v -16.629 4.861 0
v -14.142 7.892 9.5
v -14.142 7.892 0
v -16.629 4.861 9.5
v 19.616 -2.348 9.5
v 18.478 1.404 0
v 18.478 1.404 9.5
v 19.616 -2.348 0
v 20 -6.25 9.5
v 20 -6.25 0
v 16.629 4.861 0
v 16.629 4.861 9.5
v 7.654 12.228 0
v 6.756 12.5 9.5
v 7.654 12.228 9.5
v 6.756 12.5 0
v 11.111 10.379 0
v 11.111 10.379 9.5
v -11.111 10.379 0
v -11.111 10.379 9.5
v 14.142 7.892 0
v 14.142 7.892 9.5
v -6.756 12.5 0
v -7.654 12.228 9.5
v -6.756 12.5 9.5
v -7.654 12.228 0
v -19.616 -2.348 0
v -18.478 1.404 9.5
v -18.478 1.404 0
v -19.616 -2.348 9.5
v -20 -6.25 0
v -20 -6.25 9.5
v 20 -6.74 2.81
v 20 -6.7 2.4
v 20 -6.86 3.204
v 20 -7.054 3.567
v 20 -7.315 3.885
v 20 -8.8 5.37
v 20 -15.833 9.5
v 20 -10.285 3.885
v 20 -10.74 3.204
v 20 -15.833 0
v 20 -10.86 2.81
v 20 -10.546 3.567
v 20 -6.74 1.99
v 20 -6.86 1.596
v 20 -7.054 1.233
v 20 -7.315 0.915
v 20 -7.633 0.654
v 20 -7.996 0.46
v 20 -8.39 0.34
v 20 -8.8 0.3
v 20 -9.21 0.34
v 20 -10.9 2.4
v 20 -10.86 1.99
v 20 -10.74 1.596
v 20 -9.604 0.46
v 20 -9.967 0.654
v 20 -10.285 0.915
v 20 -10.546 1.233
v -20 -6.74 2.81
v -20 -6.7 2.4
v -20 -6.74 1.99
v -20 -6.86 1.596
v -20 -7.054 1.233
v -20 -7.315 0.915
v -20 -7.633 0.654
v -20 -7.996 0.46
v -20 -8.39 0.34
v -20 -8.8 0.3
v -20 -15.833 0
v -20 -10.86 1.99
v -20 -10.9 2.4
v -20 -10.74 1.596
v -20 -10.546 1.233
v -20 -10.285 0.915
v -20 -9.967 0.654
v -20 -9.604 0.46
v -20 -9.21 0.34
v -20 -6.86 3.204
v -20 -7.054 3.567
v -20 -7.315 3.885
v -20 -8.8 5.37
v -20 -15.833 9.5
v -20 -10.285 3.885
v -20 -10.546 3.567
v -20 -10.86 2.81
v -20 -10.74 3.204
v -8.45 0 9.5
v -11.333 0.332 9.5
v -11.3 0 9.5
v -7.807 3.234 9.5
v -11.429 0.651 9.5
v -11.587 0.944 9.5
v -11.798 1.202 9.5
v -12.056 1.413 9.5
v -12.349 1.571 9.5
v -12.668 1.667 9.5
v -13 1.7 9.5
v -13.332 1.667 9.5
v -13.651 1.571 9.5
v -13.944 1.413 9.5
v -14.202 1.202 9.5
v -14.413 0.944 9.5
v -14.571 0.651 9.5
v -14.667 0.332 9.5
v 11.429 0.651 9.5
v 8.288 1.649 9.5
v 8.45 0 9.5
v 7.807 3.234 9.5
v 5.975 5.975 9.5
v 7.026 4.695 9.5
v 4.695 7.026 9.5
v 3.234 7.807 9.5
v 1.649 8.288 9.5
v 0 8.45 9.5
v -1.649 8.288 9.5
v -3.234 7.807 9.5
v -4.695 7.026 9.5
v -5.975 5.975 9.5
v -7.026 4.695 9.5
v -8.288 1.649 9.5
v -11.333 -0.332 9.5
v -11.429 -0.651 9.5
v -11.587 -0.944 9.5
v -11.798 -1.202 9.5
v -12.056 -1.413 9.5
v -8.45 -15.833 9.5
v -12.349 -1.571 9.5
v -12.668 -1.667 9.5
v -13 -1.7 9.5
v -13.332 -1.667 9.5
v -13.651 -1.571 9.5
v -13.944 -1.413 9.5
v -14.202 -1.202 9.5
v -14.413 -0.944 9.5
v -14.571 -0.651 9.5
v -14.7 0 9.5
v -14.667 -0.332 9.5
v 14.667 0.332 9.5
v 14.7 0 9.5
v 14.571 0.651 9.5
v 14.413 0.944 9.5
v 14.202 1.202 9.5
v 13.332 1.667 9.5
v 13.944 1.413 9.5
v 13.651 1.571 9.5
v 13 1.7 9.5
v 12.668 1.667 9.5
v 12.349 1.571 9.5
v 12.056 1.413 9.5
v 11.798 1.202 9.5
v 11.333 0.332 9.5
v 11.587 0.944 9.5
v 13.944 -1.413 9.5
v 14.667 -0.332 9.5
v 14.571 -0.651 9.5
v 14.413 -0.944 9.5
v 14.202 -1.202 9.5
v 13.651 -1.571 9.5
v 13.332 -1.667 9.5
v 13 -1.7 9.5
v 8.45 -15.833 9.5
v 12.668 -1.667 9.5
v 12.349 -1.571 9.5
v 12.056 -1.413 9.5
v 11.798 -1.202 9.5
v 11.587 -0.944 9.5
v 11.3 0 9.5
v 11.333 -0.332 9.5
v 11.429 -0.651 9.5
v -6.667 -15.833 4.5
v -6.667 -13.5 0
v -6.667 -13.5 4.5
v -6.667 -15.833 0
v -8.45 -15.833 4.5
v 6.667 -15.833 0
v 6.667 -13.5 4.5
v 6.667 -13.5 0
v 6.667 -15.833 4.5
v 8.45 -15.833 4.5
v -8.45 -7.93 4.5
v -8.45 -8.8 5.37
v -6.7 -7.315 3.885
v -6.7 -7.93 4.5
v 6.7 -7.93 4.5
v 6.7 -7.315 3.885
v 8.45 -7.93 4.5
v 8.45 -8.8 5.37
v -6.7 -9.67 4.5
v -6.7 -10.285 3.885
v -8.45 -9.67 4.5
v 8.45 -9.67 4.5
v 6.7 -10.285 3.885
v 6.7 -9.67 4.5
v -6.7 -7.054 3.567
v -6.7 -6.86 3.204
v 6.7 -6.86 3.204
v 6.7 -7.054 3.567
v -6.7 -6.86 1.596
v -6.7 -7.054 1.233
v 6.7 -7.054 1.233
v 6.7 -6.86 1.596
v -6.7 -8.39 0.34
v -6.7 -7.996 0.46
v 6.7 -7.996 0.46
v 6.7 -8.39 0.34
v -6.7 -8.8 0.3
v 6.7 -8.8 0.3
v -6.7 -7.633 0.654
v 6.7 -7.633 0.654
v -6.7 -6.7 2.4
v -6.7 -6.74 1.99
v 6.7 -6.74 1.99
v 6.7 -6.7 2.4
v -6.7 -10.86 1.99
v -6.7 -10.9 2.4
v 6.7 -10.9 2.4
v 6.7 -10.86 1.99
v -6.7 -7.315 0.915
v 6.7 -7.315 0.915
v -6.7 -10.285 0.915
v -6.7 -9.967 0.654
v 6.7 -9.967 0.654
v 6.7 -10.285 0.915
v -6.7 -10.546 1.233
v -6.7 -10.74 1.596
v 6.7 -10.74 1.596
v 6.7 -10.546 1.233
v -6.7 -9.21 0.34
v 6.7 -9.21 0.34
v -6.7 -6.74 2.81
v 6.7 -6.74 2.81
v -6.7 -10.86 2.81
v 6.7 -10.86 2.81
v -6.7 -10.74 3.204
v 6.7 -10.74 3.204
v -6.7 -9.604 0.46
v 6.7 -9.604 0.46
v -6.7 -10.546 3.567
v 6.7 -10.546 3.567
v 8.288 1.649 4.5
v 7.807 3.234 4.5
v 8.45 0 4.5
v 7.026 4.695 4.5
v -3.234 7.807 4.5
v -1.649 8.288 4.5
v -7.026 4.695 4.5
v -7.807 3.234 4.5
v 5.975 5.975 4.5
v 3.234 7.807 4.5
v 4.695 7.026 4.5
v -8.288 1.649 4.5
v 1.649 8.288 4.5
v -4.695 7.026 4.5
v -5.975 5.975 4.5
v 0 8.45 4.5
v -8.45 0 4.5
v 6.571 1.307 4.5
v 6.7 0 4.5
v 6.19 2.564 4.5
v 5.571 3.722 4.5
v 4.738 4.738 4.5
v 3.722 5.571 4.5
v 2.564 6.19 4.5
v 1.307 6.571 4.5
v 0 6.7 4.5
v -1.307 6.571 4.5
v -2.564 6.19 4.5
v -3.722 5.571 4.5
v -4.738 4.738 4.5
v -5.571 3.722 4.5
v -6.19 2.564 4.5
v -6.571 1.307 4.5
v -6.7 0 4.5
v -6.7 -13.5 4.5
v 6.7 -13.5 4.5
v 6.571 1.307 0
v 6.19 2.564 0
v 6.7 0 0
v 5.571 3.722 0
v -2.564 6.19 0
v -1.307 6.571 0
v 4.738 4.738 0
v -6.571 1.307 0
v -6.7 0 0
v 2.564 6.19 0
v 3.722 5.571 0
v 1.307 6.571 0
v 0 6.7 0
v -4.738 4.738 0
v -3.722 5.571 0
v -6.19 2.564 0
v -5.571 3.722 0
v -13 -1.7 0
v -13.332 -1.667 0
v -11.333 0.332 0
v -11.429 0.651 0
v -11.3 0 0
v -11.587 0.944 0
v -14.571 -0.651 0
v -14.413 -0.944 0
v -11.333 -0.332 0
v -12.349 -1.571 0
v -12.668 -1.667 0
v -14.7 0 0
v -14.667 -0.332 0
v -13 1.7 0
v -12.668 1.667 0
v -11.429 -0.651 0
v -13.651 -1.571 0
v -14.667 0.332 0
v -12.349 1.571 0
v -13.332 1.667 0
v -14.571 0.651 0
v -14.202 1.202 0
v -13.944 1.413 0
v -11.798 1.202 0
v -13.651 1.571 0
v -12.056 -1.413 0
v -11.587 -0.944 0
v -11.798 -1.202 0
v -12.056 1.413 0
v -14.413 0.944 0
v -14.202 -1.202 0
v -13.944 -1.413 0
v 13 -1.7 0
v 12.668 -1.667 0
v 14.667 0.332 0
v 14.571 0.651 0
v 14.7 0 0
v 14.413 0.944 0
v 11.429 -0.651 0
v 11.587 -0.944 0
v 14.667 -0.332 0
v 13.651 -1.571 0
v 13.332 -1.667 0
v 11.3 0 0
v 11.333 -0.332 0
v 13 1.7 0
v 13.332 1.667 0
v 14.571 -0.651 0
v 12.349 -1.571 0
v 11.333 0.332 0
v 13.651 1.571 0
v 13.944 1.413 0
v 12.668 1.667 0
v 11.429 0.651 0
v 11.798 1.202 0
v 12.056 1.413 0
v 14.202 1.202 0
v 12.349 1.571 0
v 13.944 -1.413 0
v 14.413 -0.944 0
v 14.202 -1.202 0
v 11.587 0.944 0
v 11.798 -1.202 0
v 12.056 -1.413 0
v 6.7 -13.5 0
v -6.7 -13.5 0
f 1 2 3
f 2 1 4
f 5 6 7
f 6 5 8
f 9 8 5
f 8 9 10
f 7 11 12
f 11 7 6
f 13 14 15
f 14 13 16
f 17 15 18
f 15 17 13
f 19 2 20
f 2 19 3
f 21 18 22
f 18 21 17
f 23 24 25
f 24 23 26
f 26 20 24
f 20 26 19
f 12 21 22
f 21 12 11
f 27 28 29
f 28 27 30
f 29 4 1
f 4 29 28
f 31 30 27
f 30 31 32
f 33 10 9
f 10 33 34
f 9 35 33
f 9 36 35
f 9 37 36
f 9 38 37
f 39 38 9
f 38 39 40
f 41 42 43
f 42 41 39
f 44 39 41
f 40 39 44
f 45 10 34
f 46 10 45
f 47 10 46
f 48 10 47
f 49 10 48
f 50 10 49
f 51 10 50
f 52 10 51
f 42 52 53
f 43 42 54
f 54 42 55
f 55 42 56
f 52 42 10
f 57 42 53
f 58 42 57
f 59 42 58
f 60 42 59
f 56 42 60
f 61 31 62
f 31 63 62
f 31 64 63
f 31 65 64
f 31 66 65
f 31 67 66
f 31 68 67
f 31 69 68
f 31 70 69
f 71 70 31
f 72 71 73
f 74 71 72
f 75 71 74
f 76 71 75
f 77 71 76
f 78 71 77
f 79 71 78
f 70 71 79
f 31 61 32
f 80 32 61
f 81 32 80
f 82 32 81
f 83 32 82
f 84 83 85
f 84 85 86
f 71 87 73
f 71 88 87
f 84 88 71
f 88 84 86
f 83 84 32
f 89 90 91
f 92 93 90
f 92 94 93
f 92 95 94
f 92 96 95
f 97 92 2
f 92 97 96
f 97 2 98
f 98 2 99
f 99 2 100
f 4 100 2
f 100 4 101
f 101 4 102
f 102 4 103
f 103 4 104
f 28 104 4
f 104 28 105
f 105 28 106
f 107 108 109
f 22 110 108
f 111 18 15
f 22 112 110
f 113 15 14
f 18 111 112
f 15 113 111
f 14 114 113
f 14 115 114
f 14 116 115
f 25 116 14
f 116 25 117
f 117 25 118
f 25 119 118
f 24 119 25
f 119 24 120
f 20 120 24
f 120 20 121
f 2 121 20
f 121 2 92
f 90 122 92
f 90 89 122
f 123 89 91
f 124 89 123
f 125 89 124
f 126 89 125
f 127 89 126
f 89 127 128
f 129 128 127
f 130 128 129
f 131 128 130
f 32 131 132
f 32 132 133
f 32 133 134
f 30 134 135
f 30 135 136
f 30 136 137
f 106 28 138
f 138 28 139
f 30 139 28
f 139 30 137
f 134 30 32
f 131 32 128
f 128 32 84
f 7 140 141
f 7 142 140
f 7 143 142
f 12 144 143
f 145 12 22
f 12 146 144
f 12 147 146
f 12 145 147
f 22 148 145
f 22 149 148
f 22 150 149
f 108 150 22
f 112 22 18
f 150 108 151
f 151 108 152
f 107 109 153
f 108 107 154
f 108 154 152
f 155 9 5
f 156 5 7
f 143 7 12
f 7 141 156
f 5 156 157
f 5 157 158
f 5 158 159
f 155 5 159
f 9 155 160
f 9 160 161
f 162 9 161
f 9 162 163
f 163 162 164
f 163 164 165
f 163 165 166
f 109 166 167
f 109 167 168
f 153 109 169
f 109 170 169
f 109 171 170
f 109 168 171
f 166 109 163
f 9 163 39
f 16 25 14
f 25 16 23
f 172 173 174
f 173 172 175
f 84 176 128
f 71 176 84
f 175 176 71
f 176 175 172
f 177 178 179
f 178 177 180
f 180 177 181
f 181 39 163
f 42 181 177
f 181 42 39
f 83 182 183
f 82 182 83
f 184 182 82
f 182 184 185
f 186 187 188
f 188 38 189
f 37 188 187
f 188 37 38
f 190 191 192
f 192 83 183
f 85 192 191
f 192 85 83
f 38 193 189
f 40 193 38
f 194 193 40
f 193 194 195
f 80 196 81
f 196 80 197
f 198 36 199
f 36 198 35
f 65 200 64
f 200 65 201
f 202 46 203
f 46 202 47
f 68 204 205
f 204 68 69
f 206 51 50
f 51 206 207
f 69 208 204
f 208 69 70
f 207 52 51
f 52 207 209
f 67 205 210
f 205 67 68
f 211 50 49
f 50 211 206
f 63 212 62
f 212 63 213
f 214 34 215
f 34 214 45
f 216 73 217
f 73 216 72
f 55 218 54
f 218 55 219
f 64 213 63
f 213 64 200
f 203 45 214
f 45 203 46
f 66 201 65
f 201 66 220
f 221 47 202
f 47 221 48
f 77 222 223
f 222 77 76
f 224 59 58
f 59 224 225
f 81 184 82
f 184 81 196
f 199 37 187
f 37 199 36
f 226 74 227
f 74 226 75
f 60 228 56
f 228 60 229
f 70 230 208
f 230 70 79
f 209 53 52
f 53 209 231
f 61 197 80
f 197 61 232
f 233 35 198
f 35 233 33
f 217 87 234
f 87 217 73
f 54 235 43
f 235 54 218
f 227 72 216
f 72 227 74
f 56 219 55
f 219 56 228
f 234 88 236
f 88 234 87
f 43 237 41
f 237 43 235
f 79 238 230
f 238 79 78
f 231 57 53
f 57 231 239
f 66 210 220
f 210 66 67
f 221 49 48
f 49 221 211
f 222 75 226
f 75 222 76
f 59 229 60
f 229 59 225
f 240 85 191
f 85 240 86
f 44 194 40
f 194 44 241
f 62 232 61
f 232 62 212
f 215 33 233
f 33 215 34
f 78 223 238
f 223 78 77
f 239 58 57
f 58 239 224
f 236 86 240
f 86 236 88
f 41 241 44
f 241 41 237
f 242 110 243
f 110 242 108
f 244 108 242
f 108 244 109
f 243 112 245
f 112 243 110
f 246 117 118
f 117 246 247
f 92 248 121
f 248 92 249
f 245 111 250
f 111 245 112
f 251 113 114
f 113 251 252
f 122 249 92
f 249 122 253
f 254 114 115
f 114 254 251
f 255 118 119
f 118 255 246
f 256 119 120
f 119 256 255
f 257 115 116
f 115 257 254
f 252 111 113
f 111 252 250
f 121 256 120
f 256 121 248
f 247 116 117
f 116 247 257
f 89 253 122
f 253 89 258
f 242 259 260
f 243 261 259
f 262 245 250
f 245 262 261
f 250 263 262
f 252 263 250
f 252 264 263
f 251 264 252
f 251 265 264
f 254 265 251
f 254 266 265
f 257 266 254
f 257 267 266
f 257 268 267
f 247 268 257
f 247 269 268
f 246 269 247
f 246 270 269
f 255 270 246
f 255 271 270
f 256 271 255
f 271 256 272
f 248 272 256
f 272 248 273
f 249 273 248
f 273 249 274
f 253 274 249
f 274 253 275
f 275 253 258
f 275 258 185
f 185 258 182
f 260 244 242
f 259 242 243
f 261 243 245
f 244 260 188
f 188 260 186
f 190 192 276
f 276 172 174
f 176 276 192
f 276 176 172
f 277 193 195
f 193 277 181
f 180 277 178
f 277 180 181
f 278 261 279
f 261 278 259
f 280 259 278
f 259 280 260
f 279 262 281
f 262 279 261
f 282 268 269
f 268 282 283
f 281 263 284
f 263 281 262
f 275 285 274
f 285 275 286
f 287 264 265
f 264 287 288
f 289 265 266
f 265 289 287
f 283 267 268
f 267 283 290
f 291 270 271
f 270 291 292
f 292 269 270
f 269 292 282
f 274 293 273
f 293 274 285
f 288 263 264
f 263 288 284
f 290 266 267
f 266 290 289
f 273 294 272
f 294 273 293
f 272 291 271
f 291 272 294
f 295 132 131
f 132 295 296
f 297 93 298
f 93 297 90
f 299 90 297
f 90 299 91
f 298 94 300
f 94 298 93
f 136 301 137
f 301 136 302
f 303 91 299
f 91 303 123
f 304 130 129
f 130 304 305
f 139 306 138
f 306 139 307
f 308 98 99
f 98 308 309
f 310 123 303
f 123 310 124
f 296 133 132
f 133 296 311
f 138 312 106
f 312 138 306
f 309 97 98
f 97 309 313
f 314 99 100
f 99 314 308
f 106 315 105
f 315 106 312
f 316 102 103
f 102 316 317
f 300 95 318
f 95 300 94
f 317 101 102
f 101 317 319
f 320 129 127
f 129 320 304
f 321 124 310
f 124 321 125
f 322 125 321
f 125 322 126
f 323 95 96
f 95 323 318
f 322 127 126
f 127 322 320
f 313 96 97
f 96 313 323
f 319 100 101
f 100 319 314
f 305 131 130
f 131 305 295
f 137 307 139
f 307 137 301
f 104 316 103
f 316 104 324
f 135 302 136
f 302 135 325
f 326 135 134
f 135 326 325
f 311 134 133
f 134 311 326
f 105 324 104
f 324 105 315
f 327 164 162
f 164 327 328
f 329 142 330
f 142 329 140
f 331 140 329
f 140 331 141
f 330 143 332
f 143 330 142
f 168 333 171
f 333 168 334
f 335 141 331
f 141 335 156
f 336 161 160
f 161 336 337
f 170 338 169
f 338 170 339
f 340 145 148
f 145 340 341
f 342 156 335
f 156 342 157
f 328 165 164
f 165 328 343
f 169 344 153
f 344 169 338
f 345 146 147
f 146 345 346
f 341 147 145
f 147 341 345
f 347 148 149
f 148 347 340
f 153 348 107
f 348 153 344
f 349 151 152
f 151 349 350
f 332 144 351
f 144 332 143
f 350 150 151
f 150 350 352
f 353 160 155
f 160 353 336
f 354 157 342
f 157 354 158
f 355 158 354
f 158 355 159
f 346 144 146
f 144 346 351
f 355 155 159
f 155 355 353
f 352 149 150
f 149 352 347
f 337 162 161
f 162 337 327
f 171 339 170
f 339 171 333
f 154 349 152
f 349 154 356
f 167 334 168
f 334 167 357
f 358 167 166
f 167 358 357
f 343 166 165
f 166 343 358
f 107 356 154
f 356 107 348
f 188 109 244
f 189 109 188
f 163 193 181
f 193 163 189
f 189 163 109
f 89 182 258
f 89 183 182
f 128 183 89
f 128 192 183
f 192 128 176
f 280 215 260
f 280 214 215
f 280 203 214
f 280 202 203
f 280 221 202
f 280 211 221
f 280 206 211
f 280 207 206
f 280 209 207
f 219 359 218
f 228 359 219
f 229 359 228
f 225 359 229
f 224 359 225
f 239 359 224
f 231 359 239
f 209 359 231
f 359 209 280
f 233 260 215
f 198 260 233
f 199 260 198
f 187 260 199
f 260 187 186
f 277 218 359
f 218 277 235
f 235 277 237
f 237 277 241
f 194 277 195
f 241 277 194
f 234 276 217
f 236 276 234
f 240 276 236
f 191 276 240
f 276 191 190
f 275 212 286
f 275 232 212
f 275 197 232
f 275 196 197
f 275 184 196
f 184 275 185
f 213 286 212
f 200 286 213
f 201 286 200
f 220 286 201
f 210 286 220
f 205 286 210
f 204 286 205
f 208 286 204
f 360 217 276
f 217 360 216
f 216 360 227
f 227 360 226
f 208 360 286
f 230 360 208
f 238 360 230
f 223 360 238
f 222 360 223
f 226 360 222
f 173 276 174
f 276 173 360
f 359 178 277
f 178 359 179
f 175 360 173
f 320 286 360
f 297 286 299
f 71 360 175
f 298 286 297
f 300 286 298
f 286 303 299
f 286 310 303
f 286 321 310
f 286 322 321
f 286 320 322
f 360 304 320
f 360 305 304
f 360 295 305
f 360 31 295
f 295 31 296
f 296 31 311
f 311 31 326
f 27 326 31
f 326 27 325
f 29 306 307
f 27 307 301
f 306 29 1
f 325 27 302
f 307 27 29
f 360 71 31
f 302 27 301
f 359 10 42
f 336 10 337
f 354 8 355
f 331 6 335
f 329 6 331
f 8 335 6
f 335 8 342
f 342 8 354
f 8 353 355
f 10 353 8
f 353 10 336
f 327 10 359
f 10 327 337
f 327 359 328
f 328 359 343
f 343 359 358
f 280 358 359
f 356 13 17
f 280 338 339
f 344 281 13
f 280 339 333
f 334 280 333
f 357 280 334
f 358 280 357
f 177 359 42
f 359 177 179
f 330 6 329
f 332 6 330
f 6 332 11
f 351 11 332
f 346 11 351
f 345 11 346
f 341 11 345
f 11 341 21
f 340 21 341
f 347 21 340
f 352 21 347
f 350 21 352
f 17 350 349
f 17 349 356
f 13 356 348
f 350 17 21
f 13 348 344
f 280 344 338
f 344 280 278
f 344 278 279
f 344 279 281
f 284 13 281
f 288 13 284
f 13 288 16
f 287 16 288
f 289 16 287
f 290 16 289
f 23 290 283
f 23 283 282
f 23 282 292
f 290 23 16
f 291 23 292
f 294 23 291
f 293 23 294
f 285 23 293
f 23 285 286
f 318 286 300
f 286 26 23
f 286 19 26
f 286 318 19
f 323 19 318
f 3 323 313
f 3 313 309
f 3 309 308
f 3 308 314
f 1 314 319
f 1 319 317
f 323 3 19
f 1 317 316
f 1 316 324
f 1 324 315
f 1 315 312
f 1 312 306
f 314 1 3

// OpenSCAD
// Grooved Insulator Mount Adapter #3
// by Tony Buser <tbuser@gmail.com>
// uses teardrop module by Erik de Bruijn <info@erikdebruijn.nl>
// GPLv2 or later

// set them slightly larger if printer isn't perfect
barrel_diameter = 16.9; // 16 + .6
barrel_inset_diameter = 13.4; // 13 + .2

plate_length = 40;
plate_width = 25;

// probably don't want to touch the height
plate_height = 10;

// mounting bolts will need to be 15mm long?
mounting_bolt_diameter = 3.4;

// for standard plastruder - left = 13, right = 13
// for printruder II - left = 14, right = 11
left_mounting_bolt_distance = 13;
right_mounting_bolt_distance = 13;

// single horizontal bolt to clamp and hold insulator in place
// will need to be around 45mm long?
clamp_bolt_diameter = 4.2;

$fn = 32;

module teardrop(radius,height,truncated) {
	truncateMM = 1;
	union() {
		if (truncated == true) {
			intersection() {
				translate([0,0,height/2]) scale([1,1,height]) rotate([0,0,180]) cube([radius*2.5,radius*2,1],center=true);
				scale([1,1,height]) rotate([0,0,3*45]) cube([radius,radius,1]);
			}
		}
		if (truncated == false) {
			scale([1,1,height]) rotate([0,0,3*45]) cube([radius,radius,1]);
		}
		cylinder(r=radius, h = height);
	}
}

module plate() {
	difference() {
		union() {
			cube([plate_length, plate_width, plate_height]);

			// mounting bolt reinforcement
			translate([0, -plate_width/3+5, 0]) {
				cube([plate_length/3, plate_width/3-5, plate_height]);
			}

			translate([plate_length-plate_length/3, -plate_width/3+5, 0]) {
				cube([plate_length/3, plate_width/3-5, plate_height]);
			}
		}

		// barrel top
		translate([plate_length/2, plate_width/2, plate_height/2]) {
			cylinder(r=barrel_diameter/2, h=plate_height/2+1);
		}

		// barrel inset
		translate([plate_length/2, plate_width/2, -1]) {
			cylinder(r=barrel_inset_diameter/2, h=plate_height/2+2);
		}

		// mounting bolt left hole
		translate([plate_length/2-left_mounting_bolt_distance, plate_width/2, -1]) {
			cylinder(r=mounting_bolt_diameter/2, h=plate_height+2);
		}

		// mounting bolt right hole
		translate([plate_length/2+right_mounting_bolt_distance, plate_width/2, -1]) {
			cylinder(r=mounting_bolt_diameter/2, h=plate_height+2);
		}

		/*
		// mounting bolt head space left
		translate([plate_length/2-14, plate_width/2, -1]) {
			cylinder(r=mounting_bolt_head_diameter/2, h=plate_height/2+1);
		}

		// mounting bolt head space right
		translate([plate_length/2+11, plate_width/2, -1]) {
			cylinder(r=mounting_bolt_head_diameter/2, h=plate_height/2+1);
		}
		*/

		// clamp bolt		
		translate([-1, plate_width/2-barrel_inset_diameter/2-clamp_bolt_diameter/2, plate_height/2-clamp_bolt_diameter/2]) {
			rotate([0, 90, 0]) {
				teardrop(clamp_bolt_diameter/2, plate_length+2, false);
			}
		}
	}
}

module cutout() {
	intersection() {
		// carve a curve around the border
		union() {
			translate([plate_length/2, plate_width/2/2, -1]) {
				cylinder(r=plate_length/2, h=plate_height+2);
			}
			translate([0, -plate_width/2/2-plate_width/2, -1]) {		
				cube([plate_length, plate_width, plate_height+2]);
			}
		}

		difference() {
			plate();

			// top cutout
			translate([plate_length/2-barrel_diameter/2, -10, plate_height/2]) {
				cube([barrel_diameter, plate_width/2+10, plate_height/2+1]);
			}

			// bottom cutout
			translate([plate_length/2-barrel_inset_diameter/2, -1, -1]) {
				cube([barrel_inset_diameter, plate_width/2+1, plate_height/2+2]);
			}

			// remove 0.5mm from bottom to make it slide on easier
			translate([-5,-5,-1]) {
				cube([plate_length+10, plate_width+10, 1.5]);
			}
		}
	}
}

module print() {	
	// center and orient it to print correctly
	translate([-plate_length/2, -plate_width/2, -0.5]) cutout();
}

//plate();
//cutout();
//reinforcement();
print();
